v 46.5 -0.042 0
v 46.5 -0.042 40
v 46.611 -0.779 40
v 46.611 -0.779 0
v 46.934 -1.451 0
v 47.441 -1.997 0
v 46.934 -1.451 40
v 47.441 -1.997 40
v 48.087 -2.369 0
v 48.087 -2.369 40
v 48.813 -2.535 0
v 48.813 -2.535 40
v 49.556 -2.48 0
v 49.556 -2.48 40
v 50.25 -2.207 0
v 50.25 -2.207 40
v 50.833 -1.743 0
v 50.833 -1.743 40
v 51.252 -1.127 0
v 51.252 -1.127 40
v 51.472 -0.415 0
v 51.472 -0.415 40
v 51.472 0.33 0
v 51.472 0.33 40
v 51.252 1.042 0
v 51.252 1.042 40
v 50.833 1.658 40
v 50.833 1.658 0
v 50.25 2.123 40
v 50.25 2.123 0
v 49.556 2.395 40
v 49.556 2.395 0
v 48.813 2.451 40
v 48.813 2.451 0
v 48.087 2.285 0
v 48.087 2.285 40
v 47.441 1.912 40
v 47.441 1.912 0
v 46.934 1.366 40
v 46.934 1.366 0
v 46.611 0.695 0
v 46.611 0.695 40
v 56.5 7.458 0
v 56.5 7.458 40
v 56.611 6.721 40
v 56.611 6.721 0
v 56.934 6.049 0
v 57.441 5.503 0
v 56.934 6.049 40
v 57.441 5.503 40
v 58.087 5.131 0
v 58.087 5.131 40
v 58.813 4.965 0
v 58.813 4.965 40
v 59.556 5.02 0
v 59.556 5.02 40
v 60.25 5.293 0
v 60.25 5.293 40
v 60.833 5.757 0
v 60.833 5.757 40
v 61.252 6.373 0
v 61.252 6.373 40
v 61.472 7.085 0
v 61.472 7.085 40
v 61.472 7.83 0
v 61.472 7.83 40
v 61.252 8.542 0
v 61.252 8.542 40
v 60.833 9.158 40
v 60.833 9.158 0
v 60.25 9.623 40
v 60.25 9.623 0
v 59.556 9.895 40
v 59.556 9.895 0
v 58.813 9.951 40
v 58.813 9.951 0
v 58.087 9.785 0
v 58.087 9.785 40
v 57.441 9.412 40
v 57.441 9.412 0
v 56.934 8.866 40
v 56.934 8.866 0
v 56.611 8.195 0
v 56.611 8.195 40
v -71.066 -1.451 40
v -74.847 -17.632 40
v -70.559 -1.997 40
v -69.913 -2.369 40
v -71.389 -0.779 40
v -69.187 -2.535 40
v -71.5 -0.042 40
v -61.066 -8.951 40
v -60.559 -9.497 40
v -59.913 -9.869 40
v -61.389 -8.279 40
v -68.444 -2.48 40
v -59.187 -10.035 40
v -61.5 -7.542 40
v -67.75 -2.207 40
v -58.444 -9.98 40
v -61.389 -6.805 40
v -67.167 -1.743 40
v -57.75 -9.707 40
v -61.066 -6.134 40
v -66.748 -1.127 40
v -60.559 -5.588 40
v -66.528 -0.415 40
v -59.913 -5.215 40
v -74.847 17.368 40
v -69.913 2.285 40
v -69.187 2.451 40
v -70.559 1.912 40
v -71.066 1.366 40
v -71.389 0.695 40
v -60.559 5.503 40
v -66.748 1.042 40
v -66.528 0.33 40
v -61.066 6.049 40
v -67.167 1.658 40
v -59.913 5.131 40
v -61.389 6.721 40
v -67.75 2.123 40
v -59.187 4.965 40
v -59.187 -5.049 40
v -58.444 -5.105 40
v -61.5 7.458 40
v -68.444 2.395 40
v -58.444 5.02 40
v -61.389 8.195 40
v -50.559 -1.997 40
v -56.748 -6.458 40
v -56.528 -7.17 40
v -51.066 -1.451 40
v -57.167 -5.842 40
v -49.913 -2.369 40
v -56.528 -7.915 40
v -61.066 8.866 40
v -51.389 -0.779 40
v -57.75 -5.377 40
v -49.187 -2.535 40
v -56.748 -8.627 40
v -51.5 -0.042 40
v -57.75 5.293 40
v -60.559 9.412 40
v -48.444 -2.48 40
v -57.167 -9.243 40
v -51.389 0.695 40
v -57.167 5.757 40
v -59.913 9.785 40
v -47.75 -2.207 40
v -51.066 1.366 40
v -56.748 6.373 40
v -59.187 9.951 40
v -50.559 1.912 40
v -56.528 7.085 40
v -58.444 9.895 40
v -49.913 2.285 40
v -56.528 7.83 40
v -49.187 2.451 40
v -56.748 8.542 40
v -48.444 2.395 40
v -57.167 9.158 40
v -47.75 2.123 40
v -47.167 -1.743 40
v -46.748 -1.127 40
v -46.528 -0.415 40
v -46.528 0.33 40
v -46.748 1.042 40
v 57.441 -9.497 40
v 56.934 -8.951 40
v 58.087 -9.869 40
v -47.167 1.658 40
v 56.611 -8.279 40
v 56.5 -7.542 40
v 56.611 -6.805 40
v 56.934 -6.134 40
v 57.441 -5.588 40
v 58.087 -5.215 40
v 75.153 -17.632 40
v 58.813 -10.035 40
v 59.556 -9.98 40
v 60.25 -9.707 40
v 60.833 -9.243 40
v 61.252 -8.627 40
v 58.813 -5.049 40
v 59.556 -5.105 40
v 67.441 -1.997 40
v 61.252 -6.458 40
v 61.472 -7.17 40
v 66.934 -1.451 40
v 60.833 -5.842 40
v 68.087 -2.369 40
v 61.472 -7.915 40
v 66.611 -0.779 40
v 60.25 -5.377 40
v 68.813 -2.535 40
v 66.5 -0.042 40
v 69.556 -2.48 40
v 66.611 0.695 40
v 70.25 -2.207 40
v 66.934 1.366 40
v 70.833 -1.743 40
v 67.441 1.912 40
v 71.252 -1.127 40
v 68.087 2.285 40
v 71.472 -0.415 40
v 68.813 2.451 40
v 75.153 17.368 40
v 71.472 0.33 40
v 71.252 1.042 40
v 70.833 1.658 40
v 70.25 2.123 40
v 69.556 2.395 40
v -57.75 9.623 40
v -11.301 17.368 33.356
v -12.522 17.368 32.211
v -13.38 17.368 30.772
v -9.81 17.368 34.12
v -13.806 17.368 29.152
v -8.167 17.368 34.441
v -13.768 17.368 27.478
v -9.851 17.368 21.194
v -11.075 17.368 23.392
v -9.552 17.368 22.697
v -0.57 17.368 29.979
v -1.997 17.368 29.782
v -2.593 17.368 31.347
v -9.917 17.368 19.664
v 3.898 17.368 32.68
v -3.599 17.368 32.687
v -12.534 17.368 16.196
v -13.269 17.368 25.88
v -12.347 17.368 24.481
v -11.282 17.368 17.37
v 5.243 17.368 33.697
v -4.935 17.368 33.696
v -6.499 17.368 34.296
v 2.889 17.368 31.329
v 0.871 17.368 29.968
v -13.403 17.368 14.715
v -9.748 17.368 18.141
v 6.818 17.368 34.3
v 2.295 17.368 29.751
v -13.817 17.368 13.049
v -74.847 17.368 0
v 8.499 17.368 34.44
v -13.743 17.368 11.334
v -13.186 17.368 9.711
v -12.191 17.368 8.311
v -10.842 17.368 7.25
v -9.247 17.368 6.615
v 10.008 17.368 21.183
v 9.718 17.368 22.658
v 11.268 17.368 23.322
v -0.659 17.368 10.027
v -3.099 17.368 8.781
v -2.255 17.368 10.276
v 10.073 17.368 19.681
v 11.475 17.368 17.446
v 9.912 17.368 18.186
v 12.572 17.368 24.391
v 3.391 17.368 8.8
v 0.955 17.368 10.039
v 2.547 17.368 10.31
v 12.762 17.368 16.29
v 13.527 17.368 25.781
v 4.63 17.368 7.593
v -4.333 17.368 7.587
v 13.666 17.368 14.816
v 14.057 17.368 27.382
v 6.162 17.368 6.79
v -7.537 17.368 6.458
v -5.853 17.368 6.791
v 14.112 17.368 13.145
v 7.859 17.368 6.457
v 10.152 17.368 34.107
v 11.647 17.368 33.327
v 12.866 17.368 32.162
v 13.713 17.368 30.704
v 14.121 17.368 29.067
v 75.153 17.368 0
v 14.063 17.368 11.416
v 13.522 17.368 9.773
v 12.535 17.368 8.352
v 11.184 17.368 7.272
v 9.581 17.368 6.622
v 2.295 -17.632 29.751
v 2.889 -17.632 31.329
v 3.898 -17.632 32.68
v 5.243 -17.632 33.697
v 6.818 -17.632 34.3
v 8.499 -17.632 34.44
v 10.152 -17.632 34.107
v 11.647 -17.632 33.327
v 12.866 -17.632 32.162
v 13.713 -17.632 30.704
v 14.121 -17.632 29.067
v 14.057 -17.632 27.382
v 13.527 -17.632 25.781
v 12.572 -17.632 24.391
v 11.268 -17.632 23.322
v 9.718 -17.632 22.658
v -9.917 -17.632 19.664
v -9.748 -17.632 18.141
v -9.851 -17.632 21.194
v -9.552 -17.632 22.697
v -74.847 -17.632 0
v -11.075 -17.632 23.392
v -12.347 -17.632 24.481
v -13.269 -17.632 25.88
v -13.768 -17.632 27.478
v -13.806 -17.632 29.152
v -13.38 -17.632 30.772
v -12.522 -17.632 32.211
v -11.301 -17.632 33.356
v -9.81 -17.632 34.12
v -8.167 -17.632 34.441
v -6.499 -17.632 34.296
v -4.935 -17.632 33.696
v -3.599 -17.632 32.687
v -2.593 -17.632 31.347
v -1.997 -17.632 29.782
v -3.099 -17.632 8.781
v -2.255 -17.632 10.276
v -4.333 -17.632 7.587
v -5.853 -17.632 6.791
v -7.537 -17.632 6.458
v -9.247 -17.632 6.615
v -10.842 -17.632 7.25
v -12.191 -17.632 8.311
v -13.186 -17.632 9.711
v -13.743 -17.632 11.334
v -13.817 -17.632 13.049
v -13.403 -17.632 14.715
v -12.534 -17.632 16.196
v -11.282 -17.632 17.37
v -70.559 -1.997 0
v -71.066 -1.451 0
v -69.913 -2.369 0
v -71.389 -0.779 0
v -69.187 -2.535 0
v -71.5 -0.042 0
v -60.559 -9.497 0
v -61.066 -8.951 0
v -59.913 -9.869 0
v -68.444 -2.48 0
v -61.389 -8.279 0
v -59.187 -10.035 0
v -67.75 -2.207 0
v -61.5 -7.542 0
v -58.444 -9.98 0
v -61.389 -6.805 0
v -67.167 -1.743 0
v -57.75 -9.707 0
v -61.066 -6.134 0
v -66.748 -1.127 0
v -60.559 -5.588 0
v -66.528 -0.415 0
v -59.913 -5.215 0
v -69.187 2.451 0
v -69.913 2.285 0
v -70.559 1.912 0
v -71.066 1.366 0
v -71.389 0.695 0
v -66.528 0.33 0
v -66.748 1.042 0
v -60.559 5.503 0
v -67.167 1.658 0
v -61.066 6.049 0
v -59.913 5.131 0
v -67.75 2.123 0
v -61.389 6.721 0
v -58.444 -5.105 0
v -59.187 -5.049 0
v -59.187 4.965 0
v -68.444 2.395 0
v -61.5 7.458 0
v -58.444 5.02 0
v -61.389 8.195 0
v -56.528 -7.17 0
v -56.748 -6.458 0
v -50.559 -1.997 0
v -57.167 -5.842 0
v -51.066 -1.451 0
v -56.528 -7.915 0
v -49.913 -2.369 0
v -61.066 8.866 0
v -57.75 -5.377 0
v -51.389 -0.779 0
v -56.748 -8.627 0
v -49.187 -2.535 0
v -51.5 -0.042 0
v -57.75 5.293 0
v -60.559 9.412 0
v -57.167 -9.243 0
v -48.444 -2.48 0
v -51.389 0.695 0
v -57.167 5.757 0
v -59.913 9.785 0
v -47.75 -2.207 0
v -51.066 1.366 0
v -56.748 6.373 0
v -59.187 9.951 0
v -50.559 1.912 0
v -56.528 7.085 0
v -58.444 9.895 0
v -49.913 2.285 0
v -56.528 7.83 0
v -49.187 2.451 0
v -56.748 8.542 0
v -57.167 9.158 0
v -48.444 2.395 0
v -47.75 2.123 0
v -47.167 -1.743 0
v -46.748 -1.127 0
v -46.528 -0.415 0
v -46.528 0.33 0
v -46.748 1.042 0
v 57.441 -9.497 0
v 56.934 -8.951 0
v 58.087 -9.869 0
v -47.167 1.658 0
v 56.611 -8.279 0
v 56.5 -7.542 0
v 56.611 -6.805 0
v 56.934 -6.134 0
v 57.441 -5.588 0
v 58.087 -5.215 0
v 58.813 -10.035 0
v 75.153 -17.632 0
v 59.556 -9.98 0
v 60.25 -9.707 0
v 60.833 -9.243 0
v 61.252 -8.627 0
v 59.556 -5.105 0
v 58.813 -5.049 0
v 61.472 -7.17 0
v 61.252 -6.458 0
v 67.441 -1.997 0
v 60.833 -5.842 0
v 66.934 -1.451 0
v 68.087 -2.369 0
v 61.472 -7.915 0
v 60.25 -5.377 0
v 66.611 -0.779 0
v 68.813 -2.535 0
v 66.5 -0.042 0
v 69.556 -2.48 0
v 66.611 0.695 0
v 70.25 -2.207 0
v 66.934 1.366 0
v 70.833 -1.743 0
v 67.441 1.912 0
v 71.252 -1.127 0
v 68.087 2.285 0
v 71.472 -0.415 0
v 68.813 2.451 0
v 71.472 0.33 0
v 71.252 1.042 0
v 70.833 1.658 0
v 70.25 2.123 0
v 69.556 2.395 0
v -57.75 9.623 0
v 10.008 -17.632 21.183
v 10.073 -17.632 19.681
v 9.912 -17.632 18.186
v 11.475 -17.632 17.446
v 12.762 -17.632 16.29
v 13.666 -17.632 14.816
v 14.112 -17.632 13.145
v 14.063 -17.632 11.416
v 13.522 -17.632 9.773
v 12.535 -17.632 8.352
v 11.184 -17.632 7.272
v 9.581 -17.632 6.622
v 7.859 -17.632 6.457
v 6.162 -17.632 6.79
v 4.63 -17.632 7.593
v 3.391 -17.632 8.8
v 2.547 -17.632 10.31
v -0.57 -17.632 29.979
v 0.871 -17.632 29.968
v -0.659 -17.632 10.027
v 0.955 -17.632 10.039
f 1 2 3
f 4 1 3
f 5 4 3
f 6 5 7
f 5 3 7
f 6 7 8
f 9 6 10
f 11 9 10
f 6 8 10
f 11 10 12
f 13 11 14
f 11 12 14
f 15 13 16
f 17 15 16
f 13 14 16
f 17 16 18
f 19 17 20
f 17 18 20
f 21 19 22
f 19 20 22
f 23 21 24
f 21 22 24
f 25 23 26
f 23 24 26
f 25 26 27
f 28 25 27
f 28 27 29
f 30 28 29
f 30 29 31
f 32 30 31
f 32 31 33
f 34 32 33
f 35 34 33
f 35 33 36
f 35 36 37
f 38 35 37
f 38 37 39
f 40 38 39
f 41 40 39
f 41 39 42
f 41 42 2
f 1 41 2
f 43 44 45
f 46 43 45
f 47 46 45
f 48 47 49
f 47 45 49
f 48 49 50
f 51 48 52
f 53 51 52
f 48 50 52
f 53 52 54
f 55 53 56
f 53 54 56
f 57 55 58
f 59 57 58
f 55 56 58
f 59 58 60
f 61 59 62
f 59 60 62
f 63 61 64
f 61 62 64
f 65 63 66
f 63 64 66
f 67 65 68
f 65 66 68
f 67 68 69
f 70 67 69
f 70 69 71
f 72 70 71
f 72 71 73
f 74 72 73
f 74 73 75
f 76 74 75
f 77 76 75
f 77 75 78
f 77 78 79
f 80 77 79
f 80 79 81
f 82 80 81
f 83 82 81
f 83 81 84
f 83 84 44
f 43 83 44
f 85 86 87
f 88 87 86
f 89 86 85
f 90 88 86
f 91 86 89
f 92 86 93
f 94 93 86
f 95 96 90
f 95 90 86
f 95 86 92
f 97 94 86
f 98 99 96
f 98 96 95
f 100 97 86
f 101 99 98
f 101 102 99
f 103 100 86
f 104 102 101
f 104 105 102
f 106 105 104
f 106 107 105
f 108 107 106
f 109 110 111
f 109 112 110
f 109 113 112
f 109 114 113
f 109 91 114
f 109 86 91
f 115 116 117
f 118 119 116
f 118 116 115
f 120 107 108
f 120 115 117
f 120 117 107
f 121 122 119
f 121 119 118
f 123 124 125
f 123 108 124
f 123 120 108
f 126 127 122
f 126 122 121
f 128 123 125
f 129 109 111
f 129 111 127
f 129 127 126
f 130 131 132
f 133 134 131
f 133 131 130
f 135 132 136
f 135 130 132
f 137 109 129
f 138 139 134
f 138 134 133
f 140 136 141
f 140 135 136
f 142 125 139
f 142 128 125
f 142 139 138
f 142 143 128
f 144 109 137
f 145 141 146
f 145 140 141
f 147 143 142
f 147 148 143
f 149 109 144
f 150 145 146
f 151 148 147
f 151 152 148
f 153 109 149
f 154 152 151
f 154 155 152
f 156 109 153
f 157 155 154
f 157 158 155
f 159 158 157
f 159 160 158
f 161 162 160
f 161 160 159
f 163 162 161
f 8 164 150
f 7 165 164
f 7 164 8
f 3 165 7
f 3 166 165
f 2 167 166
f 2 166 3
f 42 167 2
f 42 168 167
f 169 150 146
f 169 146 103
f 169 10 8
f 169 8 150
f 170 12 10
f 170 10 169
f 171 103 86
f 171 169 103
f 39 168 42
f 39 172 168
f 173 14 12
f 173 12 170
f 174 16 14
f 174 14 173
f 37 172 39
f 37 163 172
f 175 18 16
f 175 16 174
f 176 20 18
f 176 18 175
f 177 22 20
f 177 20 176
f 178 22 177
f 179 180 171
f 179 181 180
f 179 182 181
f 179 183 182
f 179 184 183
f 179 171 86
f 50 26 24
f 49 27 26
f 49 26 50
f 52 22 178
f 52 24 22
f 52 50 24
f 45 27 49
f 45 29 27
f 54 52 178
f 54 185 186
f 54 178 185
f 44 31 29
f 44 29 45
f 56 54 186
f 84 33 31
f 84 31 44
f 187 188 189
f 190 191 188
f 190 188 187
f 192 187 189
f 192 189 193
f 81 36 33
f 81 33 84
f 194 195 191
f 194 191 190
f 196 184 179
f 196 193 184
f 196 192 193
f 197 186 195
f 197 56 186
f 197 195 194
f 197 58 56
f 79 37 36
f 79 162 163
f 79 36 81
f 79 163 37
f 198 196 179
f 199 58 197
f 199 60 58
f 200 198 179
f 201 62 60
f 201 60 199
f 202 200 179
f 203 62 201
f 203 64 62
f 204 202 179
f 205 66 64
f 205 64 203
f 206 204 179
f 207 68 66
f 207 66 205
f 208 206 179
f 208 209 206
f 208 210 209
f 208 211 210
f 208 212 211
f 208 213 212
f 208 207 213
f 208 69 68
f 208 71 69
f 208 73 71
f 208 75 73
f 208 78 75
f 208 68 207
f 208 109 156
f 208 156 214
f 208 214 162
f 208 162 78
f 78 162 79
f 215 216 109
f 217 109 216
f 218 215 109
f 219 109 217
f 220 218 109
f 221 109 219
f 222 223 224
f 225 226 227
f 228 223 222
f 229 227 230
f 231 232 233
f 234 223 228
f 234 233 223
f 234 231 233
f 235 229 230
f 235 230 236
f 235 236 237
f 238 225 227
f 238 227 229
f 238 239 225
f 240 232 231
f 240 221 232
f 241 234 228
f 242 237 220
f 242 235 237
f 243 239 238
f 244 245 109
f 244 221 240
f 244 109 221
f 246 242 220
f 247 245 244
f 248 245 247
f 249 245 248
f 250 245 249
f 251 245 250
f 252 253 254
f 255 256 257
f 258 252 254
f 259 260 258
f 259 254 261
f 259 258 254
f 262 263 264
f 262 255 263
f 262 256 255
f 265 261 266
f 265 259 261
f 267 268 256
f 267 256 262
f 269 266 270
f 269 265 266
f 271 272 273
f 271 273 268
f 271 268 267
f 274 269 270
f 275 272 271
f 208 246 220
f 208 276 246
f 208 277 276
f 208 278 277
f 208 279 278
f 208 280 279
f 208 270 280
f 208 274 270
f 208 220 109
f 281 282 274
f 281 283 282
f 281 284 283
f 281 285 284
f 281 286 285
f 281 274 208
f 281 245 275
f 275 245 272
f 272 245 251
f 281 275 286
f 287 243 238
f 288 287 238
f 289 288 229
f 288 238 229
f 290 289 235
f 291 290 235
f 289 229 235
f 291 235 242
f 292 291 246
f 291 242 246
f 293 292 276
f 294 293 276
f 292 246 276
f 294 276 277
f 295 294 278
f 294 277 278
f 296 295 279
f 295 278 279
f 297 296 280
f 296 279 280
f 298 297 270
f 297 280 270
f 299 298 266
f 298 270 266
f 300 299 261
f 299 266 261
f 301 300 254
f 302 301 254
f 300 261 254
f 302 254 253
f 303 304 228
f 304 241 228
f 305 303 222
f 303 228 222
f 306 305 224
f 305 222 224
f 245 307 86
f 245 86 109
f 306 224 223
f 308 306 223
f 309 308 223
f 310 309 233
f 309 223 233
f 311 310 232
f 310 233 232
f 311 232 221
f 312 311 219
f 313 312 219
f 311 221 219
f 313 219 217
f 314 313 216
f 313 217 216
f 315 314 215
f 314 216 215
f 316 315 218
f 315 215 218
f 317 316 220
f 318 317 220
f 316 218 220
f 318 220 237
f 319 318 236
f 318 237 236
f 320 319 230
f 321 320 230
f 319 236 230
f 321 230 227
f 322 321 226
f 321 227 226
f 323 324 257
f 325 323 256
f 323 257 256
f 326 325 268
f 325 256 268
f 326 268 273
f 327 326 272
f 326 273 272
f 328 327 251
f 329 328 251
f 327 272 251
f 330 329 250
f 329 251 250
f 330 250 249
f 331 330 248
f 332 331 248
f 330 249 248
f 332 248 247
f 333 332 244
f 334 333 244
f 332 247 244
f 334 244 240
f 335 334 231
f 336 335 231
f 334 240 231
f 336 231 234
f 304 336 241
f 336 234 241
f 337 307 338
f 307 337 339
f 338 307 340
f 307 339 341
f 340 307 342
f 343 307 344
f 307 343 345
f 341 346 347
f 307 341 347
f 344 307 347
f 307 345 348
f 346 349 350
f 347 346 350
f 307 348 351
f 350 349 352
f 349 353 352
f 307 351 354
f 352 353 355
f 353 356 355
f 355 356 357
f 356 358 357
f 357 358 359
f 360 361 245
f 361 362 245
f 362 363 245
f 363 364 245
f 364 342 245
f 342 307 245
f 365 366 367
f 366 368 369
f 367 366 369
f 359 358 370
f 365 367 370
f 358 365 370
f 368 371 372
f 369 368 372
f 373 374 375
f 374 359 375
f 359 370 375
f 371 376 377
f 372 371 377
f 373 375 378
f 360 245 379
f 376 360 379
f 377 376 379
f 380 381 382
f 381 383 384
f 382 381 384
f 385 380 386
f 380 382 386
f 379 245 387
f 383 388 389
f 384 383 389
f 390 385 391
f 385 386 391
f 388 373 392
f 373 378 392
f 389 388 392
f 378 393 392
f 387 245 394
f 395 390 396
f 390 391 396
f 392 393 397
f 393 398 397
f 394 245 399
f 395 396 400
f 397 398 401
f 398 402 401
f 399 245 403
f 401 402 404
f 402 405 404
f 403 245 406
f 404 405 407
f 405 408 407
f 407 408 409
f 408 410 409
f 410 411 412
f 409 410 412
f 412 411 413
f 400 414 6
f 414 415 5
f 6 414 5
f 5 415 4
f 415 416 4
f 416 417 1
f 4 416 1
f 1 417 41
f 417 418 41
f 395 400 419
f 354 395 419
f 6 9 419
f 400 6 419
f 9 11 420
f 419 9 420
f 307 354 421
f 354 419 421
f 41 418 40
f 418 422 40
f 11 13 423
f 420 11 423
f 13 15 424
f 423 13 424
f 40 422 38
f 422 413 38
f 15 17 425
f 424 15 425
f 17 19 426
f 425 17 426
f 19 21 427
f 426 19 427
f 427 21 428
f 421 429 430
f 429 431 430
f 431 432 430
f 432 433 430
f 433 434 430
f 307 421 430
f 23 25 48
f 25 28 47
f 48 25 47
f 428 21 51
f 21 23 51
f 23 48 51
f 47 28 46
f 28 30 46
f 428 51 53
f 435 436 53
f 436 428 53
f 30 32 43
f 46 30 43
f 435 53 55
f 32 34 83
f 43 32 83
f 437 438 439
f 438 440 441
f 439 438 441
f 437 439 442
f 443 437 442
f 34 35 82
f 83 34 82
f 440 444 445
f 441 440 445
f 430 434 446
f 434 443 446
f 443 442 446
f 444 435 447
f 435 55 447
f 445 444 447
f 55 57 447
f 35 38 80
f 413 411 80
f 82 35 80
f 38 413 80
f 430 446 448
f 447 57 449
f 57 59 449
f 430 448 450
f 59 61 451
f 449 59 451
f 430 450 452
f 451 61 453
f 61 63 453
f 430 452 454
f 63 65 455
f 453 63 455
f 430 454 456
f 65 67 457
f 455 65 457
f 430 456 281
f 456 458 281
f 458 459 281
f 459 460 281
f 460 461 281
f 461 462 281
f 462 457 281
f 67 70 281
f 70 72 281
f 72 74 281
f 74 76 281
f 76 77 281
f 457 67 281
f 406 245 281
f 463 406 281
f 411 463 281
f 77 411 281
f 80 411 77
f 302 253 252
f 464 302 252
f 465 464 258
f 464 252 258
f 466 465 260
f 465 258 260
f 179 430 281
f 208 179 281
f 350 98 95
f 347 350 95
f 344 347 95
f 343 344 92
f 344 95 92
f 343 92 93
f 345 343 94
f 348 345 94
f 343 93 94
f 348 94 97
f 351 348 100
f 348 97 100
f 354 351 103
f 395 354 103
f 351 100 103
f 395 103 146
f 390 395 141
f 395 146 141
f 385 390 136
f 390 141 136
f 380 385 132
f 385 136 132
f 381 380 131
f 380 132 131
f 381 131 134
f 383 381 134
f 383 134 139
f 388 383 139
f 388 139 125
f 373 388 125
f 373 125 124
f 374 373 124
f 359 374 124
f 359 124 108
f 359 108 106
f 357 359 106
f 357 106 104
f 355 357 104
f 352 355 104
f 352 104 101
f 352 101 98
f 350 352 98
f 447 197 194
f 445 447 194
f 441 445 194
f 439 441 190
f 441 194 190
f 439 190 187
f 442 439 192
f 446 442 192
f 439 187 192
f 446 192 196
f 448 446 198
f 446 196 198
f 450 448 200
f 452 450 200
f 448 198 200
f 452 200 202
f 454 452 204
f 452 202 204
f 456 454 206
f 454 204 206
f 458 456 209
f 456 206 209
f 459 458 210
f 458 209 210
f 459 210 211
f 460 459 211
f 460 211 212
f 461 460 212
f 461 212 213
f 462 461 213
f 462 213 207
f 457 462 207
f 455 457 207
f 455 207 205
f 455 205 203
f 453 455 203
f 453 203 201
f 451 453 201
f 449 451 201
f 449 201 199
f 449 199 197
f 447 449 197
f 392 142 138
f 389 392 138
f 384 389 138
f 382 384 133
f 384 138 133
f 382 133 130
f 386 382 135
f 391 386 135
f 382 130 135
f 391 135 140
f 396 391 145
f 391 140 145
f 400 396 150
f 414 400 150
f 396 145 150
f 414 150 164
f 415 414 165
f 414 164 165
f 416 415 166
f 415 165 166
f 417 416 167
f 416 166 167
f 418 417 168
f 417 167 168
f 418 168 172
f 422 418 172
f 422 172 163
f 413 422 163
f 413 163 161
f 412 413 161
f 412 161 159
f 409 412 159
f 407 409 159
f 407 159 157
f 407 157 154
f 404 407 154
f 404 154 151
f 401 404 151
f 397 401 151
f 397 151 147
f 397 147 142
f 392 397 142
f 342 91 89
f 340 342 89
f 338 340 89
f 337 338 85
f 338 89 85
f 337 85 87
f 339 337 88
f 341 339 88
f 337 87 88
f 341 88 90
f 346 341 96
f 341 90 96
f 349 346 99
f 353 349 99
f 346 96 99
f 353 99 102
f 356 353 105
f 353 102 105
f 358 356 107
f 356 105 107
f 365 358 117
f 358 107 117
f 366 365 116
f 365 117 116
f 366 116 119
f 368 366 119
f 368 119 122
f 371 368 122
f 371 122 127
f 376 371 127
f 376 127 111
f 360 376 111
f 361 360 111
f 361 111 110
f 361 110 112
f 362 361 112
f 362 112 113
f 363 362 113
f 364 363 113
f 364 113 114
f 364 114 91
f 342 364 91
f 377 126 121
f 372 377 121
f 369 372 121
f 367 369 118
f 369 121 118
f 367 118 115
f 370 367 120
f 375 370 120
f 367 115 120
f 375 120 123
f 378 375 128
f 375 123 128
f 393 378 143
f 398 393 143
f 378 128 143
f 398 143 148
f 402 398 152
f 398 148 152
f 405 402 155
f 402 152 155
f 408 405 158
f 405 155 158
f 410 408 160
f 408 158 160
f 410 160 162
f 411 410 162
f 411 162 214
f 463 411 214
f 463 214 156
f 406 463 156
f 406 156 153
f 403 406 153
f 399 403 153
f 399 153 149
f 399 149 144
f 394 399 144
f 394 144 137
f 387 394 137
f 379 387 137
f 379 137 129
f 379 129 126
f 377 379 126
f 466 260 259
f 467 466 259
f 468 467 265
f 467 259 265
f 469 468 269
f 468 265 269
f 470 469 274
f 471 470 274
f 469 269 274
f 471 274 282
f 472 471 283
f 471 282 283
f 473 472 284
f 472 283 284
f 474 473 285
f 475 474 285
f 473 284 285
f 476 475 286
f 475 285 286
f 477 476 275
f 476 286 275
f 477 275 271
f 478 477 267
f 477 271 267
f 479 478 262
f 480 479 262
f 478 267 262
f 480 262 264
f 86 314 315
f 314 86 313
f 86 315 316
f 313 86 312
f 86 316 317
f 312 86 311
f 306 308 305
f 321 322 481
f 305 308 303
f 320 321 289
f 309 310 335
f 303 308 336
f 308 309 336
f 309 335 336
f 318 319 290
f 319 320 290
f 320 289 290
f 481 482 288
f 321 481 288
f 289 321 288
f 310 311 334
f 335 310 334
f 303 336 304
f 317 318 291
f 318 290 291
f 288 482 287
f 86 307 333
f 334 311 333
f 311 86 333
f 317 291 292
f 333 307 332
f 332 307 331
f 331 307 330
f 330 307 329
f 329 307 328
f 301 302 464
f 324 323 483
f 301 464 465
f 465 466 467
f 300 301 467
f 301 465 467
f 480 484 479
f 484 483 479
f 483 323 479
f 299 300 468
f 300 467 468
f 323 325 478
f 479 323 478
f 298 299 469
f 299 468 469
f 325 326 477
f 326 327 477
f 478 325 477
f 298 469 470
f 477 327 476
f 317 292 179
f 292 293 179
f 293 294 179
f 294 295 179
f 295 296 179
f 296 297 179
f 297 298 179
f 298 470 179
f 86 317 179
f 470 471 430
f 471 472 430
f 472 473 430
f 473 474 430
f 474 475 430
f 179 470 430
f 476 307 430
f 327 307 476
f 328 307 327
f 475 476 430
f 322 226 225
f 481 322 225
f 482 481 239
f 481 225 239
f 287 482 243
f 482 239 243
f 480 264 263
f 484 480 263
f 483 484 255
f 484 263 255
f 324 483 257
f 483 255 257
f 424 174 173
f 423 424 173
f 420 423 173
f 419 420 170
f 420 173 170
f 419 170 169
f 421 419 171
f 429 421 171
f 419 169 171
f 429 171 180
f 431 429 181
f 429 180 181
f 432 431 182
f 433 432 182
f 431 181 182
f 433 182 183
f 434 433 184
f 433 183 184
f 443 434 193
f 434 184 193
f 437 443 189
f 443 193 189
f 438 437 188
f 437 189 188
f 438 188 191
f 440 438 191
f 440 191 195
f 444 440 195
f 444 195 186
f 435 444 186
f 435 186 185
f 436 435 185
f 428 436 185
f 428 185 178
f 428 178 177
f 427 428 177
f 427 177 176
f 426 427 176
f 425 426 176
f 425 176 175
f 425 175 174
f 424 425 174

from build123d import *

# Parameters (mm, degrees)
F0_W     = 150
F0_H     = 35
F1_DEPTH = 40
F2_D     = 5
F2_DEPTH = 50
F2_TIP   = 1.5021515476
F4_D     = 12
F4_DEPTH = 50
F4_TIP   = 3.6051637142
F5_D     = 20
F5_DEPTH = 50
F5_TIP   = 6.0086061903


with BuildPart() as f1:
    # F0 (on Top) → F1 (new body)
    with BuildSketch(Plane.XY):
        with Locations((0.152673311, -0.1323037595)):
            Rectangle(F0_W, F0_H)
    extrude(amount=F1_DEPTH)

    # F2
    with Locations(Plane(origin=(0, 0, 0), x_dir=(1, 0, 0), z_dir=(0, 0, -1))):
        with Locations((-59, -7.4576994487), (-69, 0.0423005513), (-59, 7.5423005513), (-49, 0.0423005513), (49, 0.0423005513), (59, -7.4576994487), (59, 7.5423005513), (69, 0.0423005513)):
            Hole(F2_D / 2, depth=F2_DEPTH)
            with Locations((0, 0, -(F2_DEPTH + F2_TIP / 2))):  # 118° drill point
                Cone(0, F2_D / 2, F2_TIP, mode=Mode.SUBTRACT)

    # F4
    with Locations(Plane.XZ.offset(17.6323037595)):
        with Locations((-7.847326689, 28.4498091787), (8.152673311, 28.4498091787), (-7.847326689, 12.4498091787), (8.152673311, 12.4498091787)):
            Hole(F4_D / 2, depth=F4_DEPTH)
            with Locations((0, 0, -(F4_DEPTH + F4_TIP / 2))):  # 118° drill point
                Cone(0, F4_D / 2, F4_TIP, mode=Mode.SUBTRACT)

    # F5
    with Locations(Plane.XZ.offset(17.6323037595)):
        with Locations((0.0776981695, 20)):
            Hole(F5_D / 2, depth=F5_DEPTH)
            with Locations((0, 0, -(F5_DEPTH + F5_TIP / 2))):  # 118° drill point
                Cone(0, F5_D / 2, F5_TIP, mode=Mode.SUBTRACT)


solid = f1.part
